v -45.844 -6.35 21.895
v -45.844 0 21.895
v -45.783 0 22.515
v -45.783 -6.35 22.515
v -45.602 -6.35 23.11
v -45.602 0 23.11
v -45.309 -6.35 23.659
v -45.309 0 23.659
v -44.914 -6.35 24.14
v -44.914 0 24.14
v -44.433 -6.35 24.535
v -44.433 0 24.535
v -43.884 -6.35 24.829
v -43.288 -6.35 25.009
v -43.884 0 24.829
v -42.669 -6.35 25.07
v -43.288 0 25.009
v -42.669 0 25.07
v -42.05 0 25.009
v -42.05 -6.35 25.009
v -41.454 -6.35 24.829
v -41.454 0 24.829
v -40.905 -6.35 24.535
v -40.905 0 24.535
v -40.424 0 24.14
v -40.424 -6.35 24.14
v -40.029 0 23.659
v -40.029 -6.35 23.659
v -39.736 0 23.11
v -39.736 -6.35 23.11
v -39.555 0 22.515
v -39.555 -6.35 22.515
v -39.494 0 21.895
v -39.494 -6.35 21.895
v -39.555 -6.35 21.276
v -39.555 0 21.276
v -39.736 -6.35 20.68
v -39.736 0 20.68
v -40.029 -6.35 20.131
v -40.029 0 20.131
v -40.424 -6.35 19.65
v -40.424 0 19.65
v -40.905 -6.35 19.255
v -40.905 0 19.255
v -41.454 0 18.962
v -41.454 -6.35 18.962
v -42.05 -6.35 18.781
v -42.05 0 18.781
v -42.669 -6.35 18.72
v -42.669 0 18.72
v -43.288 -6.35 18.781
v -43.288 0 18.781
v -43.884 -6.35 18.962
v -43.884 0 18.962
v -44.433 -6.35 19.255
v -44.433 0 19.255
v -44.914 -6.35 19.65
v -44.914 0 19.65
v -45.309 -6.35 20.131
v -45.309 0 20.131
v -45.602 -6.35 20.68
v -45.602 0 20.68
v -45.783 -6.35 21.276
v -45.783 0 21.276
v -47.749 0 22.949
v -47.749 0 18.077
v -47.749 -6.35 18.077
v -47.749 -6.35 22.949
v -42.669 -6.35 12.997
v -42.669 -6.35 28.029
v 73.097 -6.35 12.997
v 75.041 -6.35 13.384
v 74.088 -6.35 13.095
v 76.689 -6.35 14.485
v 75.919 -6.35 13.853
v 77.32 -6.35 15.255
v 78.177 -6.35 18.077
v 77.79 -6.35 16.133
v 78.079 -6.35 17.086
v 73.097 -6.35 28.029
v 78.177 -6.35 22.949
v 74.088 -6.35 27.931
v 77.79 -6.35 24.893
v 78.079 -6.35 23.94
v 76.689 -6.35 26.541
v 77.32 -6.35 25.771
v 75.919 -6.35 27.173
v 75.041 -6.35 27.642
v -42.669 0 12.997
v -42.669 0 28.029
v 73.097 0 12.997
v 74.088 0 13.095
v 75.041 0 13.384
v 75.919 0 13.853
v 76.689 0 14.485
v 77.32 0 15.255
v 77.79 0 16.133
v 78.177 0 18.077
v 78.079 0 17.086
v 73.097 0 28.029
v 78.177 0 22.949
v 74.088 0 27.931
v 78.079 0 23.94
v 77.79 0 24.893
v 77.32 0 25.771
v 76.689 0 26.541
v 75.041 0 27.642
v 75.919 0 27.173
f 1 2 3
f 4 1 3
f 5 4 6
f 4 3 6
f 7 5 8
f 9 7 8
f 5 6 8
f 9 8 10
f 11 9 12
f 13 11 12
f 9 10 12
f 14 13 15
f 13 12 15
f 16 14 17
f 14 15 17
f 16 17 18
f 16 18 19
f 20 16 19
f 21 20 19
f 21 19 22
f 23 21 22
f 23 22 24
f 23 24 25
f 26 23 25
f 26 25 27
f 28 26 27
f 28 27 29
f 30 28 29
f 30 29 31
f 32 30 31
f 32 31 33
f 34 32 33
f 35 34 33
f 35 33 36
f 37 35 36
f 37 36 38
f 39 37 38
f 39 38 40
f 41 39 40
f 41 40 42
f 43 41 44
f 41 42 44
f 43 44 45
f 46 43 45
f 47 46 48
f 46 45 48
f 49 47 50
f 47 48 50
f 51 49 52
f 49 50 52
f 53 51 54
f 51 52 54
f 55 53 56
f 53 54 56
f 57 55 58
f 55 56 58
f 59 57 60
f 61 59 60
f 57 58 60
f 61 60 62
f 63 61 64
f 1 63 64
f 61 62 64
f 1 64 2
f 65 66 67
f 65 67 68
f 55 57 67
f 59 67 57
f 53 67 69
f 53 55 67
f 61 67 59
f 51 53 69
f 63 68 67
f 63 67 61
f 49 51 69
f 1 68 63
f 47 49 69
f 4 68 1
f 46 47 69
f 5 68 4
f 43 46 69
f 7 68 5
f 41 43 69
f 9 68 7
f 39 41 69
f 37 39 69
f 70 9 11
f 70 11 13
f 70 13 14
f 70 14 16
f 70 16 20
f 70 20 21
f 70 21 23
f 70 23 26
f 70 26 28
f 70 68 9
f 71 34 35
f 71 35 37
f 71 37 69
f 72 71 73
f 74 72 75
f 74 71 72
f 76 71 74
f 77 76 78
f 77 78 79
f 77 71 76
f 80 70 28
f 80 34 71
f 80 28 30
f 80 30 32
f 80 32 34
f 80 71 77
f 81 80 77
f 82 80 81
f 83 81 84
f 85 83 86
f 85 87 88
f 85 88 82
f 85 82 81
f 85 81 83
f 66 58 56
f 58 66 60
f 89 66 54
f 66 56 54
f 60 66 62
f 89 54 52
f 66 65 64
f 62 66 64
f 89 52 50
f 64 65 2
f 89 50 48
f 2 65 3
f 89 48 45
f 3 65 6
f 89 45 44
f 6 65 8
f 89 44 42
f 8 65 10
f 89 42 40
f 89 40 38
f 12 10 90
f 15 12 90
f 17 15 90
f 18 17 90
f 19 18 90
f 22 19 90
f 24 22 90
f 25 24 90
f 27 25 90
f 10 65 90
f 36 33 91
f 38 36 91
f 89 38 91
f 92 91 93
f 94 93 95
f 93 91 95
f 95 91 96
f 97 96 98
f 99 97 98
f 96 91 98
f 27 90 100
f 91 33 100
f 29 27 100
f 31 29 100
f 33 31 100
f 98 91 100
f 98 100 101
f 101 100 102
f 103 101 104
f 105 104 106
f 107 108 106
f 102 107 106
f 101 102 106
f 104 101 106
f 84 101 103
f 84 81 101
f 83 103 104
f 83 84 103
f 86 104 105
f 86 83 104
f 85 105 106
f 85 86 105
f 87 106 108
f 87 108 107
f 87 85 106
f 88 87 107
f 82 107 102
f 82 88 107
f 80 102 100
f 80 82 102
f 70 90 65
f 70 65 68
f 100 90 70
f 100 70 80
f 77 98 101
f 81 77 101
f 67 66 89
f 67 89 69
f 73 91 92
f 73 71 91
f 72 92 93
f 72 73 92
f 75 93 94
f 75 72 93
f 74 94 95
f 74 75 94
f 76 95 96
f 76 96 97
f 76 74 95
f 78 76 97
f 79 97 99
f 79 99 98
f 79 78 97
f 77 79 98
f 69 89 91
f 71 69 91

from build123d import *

# Parameters (mm, degrees)
F0_W     = 125.92558
F0_H     = 15.03172
F1_DEPTH = 6.35
F2_R     = 5.08
F3_SIZE  = 5.08
F5_D     = 6.35


with BuildPart() as f1:
    # F0 (on Front) → F1 (new body)
    with BuildSketch(Plane.XZ):
        with Locations((15.213812, 20.512795)):
            Rectangle(F0_W, F0_H)
    extrude(amount=F1_DEPTH)

    # F2
    f2_edges = [f1.edges().sort_by_distance(p)[0] for p in [
        (78.176602, -3.175, 28.028655),
        (78.176602, -3.175, 12.996935),
    ]]
    fillet(f2_edges, radius=F2_R)

    # F3
    f3_edges = [f1.edges().sort_by_distance(p)[0] for p in [
        (-47.748978, -3.175, 28.028655),
        (-47.748978, -3.175, 12.996935),
    ]]
    chamfer(f3_edges, length=F3_SIZE)

    # F5 (through all)
    with Locations(Plane.XZ.offset(6.35)):
        with Locations((-42.668978, 21.895384)):
            Hole(F5_D / 2)


solid = f1.part
